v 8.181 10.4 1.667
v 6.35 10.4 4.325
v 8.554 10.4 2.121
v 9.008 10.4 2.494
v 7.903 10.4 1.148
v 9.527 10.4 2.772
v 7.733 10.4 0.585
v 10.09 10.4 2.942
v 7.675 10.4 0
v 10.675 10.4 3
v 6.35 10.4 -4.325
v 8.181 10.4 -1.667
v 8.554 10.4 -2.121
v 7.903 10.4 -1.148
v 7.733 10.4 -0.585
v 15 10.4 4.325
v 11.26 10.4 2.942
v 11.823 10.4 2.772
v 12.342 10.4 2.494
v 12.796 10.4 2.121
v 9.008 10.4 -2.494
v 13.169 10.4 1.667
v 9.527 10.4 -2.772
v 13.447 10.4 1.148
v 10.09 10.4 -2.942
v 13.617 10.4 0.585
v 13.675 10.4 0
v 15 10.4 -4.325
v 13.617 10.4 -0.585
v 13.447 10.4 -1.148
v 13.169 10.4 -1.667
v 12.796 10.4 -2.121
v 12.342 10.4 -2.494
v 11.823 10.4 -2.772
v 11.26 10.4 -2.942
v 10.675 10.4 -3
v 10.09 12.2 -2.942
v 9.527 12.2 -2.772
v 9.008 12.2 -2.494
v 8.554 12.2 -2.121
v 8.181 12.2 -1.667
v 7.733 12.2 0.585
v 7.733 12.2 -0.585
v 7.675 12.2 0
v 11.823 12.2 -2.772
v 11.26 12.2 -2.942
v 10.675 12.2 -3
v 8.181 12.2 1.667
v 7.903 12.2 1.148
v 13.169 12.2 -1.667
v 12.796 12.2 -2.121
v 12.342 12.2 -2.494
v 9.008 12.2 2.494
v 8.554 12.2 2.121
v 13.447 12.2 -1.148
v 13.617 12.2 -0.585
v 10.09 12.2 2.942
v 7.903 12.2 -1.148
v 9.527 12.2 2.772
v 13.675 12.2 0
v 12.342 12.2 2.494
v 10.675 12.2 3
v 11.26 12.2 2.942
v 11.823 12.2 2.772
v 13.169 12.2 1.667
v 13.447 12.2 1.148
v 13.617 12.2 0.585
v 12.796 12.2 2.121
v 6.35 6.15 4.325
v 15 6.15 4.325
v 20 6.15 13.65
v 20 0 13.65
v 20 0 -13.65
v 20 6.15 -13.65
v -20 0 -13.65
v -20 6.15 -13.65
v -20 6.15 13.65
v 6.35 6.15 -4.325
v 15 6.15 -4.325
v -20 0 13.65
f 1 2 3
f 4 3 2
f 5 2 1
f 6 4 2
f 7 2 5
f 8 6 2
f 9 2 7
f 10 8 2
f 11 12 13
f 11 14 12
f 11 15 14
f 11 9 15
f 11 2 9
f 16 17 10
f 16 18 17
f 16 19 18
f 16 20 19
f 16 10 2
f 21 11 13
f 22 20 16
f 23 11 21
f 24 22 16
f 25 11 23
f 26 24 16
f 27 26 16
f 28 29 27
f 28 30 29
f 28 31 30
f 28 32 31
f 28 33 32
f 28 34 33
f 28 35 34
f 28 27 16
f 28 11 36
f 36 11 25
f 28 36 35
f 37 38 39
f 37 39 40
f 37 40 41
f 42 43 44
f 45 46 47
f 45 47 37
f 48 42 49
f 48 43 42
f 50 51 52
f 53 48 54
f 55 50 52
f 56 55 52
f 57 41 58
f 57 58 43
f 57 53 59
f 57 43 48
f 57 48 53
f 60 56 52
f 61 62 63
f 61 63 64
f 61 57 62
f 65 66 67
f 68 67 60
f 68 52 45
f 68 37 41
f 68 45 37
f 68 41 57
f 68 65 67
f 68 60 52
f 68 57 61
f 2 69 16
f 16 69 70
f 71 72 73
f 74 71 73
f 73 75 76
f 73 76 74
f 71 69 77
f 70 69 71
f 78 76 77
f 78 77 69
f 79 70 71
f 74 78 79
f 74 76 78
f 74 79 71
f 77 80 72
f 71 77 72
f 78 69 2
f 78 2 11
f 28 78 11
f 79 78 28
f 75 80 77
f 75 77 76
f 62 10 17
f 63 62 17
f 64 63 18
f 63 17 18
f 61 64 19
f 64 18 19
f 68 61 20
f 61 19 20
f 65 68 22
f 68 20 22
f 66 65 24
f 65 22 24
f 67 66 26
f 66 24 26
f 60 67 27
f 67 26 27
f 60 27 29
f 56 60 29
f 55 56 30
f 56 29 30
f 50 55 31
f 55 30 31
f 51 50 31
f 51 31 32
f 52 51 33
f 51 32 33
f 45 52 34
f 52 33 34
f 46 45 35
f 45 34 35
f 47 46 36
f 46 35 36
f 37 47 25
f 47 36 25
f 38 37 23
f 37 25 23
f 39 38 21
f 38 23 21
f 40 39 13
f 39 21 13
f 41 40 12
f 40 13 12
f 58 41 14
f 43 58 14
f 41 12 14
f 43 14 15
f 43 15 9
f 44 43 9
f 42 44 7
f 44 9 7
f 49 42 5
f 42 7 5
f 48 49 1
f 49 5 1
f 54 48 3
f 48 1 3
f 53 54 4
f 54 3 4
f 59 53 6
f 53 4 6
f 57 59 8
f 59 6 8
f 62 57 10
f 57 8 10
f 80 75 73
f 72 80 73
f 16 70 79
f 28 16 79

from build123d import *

# Parameters (mm, degrees)
SKETCH_1_W      = 40
SKETCH_1_H      = 27.3
EXTRUDE_1_DEPTH = 6.15
EXTRUDE_START   = -6.15
SKETCH_2_W      = 8.65
SKETCH_2_H      = 8.65
EXTRUDE_2_DEPTH = 10.4
SKETCH_3_R      = 3
EXTRUDE_3_DEPTH = 1.8


with BuildPart() as part:
    # 草图1 → 凸台-拉伸1 (new body)
    with BuildSketch(Plane(origin=(0, 0, 0), x_dir=(1, 0, 0), z_dir=(0, 1, 0))):
        Rectangle(SKETCH_1_W, SKETCH_1_H)
    extrude(amount=EXTRUDE_1_DEPTH)

    # 草图2 → 凸台-拉伸2 (add)
    with BuildSketch(Plane(origin=(0, 6.15, 0), x_dir=(1, 0, 0), z_dir=(0, 1, 0)).offset(EXTRUDE_START)):
        with Locations((10.675, 0)):
            Rectangle(SKETCH_2_W, SKETCH_2_H)
    extrude(amount=EXTRUDE_2_DEPTH)

    # 草图3 → 凸台-拉伸3 (add)
    with BuildSketch(Plane(origin=(0, 10.4, 0), x_dir=(1, 0, 0), z_dir=(0, 1, 0))):
        with Locations(Location((10.675, 0, 0), (0, 0, 270))):
            Circle(SKETCH_3_R)
    extrude(amount=EXTRUDE_3_DEPTH)


solid = part.part
